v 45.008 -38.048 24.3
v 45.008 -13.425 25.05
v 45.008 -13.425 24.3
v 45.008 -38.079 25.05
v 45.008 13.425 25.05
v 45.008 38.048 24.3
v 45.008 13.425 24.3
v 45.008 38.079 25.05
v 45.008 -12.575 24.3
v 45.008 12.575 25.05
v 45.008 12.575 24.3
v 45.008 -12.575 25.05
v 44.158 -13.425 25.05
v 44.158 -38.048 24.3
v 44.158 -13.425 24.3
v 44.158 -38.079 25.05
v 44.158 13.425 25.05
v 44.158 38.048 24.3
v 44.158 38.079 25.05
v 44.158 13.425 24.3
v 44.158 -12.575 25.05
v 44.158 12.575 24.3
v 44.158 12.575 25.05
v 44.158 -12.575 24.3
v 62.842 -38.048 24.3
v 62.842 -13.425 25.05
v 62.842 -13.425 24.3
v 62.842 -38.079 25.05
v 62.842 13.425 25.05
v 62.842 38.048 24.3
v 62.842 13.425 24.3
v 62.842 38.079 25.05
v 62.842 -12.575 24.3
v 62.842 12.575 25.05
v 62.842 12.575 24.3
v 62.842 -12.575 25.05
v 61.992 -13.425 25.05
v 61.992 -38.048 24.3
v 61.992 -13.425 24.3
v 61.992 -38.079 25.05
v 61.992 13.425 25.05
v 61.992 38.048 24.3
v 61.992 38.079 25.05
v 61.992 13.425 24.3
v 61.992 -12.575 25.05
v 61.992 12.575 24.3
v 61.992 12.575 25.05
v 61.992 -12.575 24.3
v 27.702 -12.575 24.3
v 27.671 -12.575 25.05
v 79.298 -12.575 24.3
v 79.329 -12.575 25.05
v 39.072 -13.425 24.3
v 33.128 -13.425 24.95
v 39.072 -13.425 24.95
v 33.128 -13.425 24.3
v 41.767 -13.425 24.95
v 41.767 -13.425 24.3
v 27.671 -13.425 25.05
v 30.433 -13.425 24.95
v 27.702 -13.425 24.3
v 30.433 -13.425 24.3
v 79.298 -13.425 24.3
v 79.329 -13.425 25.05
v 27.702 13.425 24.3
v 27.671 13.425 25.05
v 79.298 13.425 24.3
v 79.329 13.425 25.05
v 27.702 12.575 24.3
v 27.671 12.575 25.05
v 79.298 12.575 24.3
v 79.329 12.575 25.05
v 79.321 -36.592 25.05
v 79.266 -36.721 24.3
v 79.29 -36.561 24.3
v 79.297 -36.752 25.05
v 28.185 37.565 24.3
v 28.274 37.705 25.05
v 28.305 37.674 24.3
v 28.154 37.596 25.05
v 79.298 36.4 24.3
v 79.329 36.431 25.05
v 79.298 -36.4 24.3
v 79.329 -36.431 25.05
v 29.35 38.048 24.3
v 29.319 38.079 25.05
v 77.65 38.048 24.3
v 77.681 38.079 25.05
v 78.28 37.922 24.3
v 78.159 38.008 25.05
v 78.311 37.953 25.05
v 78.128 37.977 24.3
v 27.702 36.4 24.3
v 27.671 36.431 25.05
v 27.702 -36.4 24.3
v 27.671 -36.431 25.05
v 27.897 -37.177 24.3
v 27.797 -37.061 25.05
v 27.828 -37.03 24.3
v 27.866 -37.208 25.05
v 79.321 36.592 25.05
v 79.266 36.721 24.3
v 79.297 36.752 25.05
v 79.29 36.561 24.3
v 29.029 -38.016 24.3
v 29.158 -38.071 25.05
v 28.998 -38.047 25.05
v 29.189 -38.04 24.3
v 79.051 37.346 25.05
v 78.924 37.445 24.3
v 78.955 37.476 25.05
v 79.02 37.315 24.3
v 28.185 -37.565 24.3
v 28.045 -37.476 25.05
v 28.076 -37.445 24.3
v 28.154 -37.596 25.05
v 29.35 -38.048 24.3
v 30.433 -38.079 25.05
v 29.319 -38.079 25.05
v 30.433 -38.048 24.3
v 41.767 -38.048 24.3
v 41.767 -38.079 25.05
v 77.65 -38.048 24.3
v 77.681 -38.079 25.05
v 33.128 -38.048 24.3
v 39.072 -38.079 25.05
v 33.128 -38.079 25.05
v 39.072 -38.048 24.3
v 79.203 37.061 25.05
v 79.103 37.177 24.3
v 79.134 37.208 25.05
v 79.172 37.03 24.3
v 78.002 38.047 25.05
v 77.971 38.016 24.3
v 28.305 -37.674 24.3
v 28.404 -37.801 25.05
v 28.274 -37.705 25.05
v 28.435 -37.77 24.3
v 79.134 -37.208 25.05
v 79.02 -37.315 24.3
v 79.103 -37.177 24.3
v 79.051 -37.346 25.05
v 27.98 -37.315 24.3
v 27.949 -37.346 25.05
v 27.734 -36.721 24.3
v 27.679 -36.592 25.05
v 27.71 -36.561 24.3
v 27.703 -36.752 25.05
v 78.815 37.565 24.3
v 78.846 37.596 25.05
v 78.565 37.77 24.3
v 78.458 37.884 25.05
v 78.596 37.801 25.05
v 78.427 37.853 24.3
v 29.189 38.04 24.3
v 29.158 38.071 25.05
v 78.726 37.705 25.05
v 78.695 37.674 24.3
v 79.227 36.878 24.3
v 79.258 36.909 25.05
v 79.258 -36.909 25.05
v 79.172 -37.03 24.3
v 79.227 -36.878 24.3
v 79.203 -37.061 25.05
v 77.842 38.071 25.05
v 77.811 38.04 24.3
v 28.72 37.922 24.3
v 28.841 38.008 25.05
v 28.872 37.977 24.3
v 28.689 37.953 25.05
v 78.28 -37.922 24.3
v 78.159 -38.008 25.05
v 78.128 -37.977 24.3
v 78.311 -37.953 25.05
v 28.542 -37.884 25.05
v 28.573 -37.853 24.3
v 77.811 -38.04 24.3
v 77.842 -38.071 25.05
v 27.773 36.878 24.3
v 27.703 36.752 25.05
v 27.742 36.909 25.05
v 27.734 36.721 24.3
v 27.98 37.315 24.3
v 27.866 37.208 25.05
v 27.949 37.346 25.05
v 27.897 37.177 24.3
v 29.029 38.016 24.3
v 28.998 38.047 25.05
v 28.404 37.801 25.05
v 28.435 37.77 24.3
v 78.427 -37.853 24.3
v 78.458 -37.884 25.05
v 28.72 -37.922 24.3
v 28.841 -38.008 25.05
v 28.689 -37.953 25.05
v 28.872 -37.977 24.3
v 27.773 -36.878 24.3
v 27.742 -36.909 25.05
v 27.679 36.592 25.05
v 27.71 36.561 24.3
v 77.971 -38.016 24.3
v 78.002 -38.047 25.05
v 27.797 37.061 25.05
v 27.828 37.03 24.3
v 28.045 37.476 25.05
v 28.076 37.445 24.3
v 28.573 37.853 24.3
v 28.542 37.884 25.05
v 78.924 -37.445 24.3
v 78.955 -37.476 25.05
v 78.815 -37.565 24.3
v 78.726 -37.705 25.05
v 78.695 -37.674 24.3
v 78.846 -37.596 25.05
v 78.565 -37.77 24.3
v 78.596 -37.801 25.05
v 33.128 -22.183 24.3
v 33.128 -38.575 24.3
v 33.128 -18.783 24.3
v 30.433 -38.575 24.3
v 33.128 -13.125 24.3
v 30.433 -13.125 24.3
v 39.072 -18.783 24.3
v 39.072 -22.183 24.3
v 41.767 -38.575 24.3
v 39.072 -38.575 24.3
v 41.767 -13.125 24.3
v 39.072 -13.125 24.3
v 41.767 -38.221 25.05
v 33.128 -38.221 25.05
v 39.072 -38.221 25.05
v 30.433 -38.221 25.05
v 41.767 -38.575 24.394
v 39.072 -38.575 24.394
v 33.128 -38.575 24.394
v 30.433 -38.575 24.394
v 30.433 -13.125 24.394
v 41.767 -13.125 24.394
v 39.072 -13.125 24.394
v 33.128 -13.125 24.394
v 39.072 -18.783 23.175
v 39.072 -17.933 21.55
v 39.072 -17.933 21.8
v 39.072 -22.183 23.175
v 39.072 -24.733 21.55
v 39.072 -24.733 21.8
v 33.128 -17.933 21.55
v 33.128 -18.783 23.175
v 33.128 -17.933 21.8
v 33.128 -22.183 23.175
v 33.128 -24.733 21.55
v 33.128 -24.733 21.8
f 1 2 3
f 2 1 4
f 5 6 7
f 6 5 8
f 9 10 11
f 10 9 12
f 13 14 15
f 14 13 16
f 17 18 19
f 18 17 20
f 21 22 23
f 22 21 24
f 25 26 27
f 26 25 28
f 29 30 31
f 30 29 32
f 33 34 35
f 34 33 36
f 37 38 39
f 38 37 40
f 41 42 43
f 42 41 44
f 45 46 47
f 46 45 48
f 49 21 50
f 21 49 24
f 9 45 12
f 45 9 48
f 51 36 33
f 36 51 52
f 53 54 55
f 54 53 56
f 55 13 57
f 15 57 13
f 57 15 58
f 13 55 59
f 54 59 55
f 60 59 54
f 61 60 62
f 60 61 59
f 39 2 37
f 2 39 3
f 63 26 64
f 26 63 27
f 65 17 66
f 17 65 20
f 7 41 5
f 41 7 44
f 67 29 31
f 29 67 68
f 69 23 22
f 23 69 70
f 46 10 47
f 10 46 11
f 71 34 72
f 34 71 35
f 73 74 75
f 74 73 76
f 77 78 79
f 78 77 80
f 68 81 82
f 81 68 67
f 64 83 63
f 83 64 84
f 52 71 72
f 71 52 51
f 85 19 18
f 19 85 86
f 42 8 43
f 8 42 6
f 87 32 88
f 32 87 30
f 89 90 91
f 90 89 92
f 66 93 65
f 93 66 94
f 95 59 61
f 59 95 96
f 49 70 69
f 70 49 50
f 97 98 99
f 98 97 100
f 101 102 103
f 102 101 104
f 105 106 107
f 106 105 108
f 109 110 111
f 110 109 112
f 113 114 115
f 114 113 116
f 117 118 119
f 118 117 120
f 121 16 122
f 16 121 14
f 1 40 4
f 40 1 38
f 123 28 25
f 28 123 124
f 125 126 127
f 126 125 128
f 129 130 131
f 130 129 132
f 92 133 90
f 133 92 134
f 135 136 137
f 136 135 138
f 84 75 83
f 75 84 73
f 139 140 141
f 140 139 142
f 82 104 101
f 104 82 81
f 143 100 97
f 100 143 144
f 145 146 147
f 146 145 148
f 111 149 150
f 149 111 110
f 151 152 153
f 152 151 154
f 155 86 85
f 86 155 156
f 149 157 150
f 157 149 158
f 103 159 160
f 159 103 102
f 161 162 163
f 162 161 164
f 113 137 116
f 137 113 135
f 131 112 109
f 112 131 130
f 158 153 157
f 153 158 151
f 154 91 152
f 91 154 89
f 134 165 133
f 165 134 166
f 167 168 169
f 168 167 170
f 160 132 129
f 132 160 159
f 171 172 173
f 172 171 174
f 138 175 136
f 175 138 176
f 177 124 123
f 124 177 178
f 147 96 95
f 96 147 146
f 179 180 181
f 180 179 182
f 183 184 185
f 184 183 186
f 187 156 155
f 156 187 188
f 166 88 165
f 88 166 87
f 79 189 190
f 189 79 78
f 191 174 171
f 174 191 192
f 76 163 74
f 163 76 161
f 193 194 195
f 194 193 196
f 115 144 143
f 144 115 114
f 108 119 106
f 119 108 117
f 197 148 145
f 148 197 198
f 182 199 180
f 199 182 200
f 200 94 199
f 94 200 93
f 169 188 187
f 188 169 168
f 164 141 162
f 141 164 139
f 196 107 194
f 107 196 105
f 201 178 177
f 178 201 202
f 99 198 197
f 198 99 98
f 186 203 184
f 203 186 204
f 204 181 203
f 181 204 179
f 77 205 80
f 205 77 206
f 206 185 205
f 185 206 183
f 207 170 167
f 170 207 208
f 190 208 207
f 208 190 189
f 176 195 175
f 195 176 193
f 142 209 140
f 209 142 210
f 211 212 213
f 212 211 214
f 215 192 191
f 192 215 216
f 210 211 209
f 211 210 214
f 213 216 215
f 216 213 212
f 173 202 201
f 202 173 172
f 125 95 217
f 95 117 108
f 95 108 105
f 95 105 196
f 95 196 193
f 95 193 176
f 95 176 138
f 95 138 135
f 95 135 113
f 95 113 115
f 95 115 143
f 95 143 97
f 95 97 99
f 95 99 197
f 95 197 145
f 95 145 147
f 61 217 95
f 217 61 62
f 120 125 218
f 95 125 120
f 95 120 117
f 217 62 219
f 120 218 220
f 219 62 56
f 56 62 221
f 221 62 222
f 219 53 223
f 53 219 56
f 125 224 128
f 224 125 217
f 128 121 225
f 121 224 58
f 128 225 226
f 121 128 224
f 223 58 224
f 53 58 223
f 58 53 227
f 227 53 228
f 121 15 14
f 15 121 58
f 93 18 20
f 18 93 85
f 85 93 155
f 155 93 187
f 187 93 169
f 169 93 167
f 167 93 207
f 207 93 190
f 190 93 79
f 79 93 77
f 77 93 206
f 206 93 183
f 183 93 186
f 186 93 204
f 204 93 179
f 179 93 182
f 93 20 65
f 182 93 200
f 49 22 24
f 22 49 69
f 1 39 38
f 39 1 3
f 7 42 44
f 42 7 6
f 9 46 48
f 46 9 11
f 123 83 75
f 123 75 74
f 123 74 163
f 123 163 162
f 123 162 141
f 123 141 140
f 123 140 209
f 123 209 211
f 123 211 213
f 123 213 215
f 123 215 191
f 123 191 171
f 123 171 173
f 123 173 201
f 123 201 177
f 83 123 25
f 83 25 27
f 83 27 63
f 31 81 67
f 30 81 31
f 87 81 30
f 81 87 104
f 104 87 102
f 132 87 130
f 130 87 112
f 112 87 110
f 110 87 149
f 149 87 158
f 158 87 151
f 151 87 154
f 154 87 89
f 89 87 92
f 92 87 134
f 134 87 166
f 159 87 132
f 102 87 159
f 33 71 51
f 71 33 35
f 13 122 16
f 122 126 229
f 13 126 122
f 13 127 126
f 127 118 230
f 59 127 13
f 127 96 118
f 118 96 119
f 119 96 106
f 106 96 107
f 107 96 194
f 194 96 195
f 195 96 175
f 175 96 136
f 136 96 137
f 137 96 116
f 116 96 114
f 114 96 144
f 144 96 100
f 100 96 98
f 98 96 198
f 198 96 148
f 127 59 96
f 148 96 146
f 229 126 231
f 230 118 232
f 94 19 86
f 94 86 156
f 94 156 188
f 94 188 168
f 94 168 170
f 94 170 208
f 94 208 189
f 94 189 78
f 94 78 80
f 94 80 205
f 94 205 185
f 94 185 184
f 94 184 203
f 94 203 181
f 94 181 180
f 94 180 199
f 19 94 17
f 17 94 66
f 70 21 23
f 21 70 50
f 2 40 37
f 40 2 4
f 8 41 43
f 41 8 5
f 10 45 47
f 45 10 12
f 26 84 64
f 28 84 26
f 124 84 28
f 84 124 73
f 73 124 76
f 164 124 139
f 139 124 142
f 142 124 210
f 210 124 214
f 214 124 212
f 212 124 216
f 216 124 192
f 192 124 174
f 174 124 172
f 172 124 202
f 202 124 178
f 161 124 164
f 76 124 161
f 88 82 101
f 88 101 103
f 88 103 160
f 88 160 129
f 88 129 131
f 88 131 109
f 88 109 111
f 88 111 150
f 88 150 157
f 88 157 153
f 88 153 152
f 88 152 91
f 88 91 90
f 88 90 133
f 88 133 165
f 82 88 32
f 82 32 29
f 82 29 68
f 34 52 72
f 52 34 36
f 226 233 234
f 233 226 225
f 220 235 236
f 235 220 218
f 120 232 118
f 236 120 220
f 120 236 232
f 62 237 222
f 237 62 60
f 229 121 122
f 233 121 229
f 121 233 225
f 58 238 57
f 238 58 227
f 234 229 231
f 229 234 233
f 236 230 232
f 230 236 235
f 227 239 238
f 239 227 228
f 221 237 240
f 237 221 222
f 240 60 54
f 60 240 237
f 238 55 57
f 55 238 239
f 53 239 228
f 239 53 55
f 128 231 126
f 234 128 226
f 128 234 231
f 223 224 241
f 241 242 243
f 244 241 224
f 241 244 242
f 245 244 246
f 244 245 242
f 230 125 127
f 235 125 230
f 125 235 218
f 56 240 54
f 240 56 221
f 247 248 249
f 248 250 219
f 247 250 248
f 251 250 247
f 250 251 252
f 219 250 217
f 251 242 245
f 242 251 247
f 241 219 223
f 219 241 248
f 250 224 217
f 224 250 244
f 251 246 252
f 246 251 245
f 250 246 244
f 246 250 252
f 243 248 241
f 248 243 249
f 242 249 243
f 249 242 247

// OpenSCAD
/**
 * Harbor Freight Small Parts Storage Tray Bins
 * 
 * Insipired by: 
 *     https://www.thingiverse.com/thing:569241
 *     https://www.thingiverse.com/thing:671740
 * 
 * You can use this as a box generator. Woohoo. Fun.
 * 
 * I'm including many STLs for boxes I've generated and use.
 * But of course you can use this to generate custom boxes, too. Without having to learn a CAD tool. :-)
 * 
 * I've made the module take a couple of parameters.
 *    wall_thickness - let's you control the wall thickness, so you can optimize STLs for your printer nozzle and layer height.
 *    subdivisions = [by length, by width] Lets you define a number of 'buckets' to put in each tray. A normal tray will have 1 bucket, which translates to [1, 1]. If you wanted 3 buckets along the length, and two rows of them, [3, 2] is what you want.
 *    box_size = [length , width] - Lets you define the size of the box in units it occupies in the storage system! A 'small' box is a [1, 1]. The HF kit comes with [1,1], [2, 1], and [2, 2] sizes.
*/

/** -- Basic Single "bucket" (no sub-divisions) trays -- */
 
// Your basic 'small' tray.
//hf_tray();

// A 'medium' tray
//hf_tray(box_size = [1, 2]);

// A 'large' tray
//hf_tray(box_size = [2, 2]);

// A tray size you can't even get at HF.
//hf_tray(box_size = [3, 3]);

/** -- Subdivisions! -- */

// A 'small' tray with sub-divisions (3 along the length, 2 along the width).
//hf_tray(subdivisions = [3, 2]);

// A Medium tray with 6 slots to put things like through-hole resistor tape reels in.
//hf_tray(box_size = [2, 2], subdivisions = [6, 1]); 


/** -- Wall Thickness! -- */
/* Wall thickness can be optimized to give your slicing 
    software something really peaceful to work with. It can 
    speed up print times, improve print quality, etc.

    I've tested a few of these configurations with Slic3r using
    0.25 and 0.4 nozzles printing nylon trimmer string.
*/
     
// Printing with a 0.25 nozzle, at 0.10mm / layer, 3 perimeters.
//hf_tray(subdivisions = [1, 1], wall_thickness = 0.71);

// Printing with a 0.25 nozzle, at 0.20mm / layer, 2 perimeters.
//hf_tray(subdivisions = [2, 2], wall_thickness = 0.66);

// Printing with a 0.4 nozzle, at 0.10mm / layer, 2 perimeters.
//hf_tray(subdivisions = [2, 2], wall_thickness = .88, lip_height = 1.5);


/** -- lip_height! -- */
/* For more robust / ridgid boxes along the top edge, increase the lip height. 
    The HF trays tend to have a 0.75mm lip, a consequence of the injection 
    molding process with polypropylene. I found that using the thin walls above
    things were a bit too flimsey at the top edge for my liking, and a slightly taller
    lip worked well to stiffen up the nylon.
*/

//hf_tray(box_size = [2, 2],
//            subdivisions = [6, 1],
//            wall_thickness = 0.88,
//            lip_height = 1.5);
         
/** -- Stacking Fractional height units!!! -- */
/* To really make the most of the storage space, set a box_size with a fractional 'z' height,
    make sure you make the lower boxes is_top = false
*/

// A tray that's one of the lower two in a stack of 3.
//hf_tray(box_size = [2, 2, (1/2)],
//            subdivisions = [4, 2],
//            wall_thickness = 0.86,
//            lip_height = 1.5,
//            is_top = true);
            

// A tray that's the top box in a stack of 3.
//hf_tray(box_size = [2, 2, (1/3)],
//            subdivisions = [6, 1],
//            wall_thickness = 0.88,
//            lip_height = 1.5,
//            is_top = true);


/** Customizer Support **/
 
/* [Box Dimensions] */
// Number of units wide a box is.
box_width = 1;
// Number of units long a box is.
box_length = 2;

// Box Depth how tall the box is (for stacking).
box_depth = 0.5; // [1:1, 0.5:1/2, 0.33333:1/3, 0.25:1/4, 0.75:3/4, 0.66666:2/3]

// Is the box the top box in the stack?
top_of_stack = 1; // [1:Yes, 0:No]
lid = 0; // [1:Yes, 0:No]

// How many subdivisions along the width of the box.
subdivisions_wide = 3;
// How many subdivisions along the length of the box.
subdivisions_long = 3;


/* [Bin Geometry] */
// Height of the lip around the top
lip = .5;
// Corner Radius
corner_radius = 2.5;
// Taper ration of the bin.
taper = 0.9;
// Height of the bin.
box_height = 47.5; // [47.5, 46.15]

/* [Lids] */
lids = 1; // [1:Yes, 0:No]

/* [Foot Geometry] */
// Separate the feet from the box? (for easier printing)
separate_feet = 1; // [1:Yes, 0:No]
// Slop to use when creating the joinery hole for the foot.
// 0.2 works well when using a 0.4mm nozzle.
foot_joinery_slop = 0.2;
// height of the foot, in mm.
foot_height = 3.85; // [3.85, 1.75]
// Taper height. Foot will taper from the bottom to this height, at which point it will be 'full size'.
foot_taper_height = 2.00;
// Taper the foot to the bottom by this many mm. Makes it easier to nest.
foot_taper = 0.5;


/* [Print Tweaks] */
// Specify this based on your print settings.
wall_thickness = 0.85;
bottom_thickness = 0.75;

// The height of the wider reinforcing lip at the top of the box.
lip_height = 1.5;

/* [Hidden] */
$fn = 64;



hf_tray(box_size = [box_width, box_length, box_depth],
            subdivisions = [subdivisions_wide, subdivisions_long],
            wall_thickness = wall_thickness,
            lip_height = lip_height,
            is_top = (top_of_stack == 1));

module hf_tray(box_size = [1, 1], subdivisions = [1, 1], wall_thickness = 0.8, lip_height = 0.75, is_top = true) {
    // Size of a 'small' unit in the storage system.
    unit_length = 54.5 * box_size[0];
    unit_width = 39.5 * box_size[1] ;
    unit_height = ((box_height - bottom_thickness) * (len(box_size) < 3 ? 1 : box_size[2])) +
                         (len(box_size) < 3 || box_size[2] == 1 ? 0 : box_size[2] * (corner_radius + wall_thickness));

    x_div = subdivisions[0];
    y_div = subdivisions[1];

    // Do a bunch of boundary calculations up-front, so we don't have to keep doing math all over the place.

    // Top lip x and y
    top_lip_length = unit_length - (corner_radius * 2);
    top_lip_width = unit_width - (corner_radius * 2);

    // Top x and y
    top_length = top_lip_length - (lip * 2);
    top_width = top_lip_width - (lip * 2);

    top_inside_length = top_length - (wall_thickness * 2);
    top_inside_width = top_width - (wall_thickness * 2);
    
    // Lid
    lid_length = top_lip_length / y_div - (wall_thickness * y_div);
    lid_width = top_lip_width / x_div - (wall_thickness * x_div);

    // Bottom x and y
    bottom_length = top_length - (taper * 2);
    bottom_width = top_width - (taper * 2);

    bottom_inside_length = bottom_length - (wall_thickness * 2);
    bottom_inside_width = bottom_width - (wall_thickness * 2);
    
    // Flip it right-side up.
    translate([0, 0, unit_height + foot_height]) rotate([180, 0, 0]) {
    difference() {
        // Union everything.
        union() {
            // Subtract the 'inside' void'
            difference() {
                // Main shell.
                union () {
                    // top lip.
                    minkowski() {
                        translate([-top_lip_length / 2, -top_lip_width / 2, 0]) cube([top_lip_length, top_lip_width, lip_height / 2]);
                        union() {
                            cylinder(r = corner_radius, h = lip_height / 2);
                            translate([0, 0, lip_height / 2]) 
                            cylinder(r1 = corner_radius, 
                                                r2 = corner_radius - wall_thickness / 2, h = lip_height / 2);
                        }
                    }

                    // Taperd Body
                    minkowski() {
                        // Hull the top and bottom for a proper taper.
                        hull() {
                            // top 
                            translate([-top_length / 2, -top_width / 2, lip_height]) cube([top_length, top_width, 1]);
                            // bottom
                            translate([-bottom_length / 2, -bottom_width / 2, unit_height - corner_radius - 1]) cube([bottom_length, bottom_width, 1]);
                        }
                        // Minkowski a sphere around it.
                        scale([1, 1, (separate_feet ? 1.75 : 1)])
                            sphere( r = corner_radius);
                    }
                }
                
                // Cut the bottom of the body flush.
                // (removes minkowski round-over at the 'top' of the bin)
                translate([-unit_length / 2, -unit_width / 2, -corner_radius * 2]) 
                    cube([unit_length, unit_width, corner_radius * 2]);
                // (removes minkowski rount-over at the 'bottom' of the bin)
                translate([-unit_length / 2, -unit_width / 2, unit_height]) 
                    cube([unit_length, unit_width, corner_radius * 2]);
                
                // Produce a 'positive' to remove from the main cavity. Think of it like a press die.
                inside_positive(top_length, top_width, bottom_length, bottom_width, 
                                unit_height, corner_radius, bottom_thickness, wall_thickness, x_div, y_div, is_top,
                                top_inside_length, top_inside_width);
            }

            // Add the feet.
            foot(bottom_length = bottom_length, bottom_width = bottom_width, unit_height = unit_height, corner_radius = corner_radius, foot_height = foot_height);
            mirror([1, 0, 0]) foot(bottom_length = bottom_length, bottom_width = bottom_width, unit_height = unit_height, corner_radius = corner_radius, foot_height = foot_height);
            mirror([0, 1, 0]) foot(bottom_length = bottom_length, bottom_width = bottom_width, unit_height = unit_height, corner_radius = corner_radius, foot_height = foot_height);
            rotate([0, 0, 180]) foot(bottom_length = bottom_length, bottom_width = bottom_width, unit_height = unit_height, corner_radius = corner_radius, foot_height = foot_height);
        }
        
        
        // If we're doing detached feet, add the holes for feet.
        if (separate_feet == 1) {
                foot_holes(bottom_length = bottom_length, bottom_width = bottom_width, unit_height = unit_height, corner_radius = corner_radius, foot_height = foot_height);
                mirror([1, 0, 0]) foot_holes(bottom_length = bottom_length, bottom_width = bottom_width, unit_height = unit_height, corner_radius = corner_radius, foot_height = foot_height);
                mirror([0, 1, 0]) foot_holes(bottom_length = bottom_length, bottom_width = bottom_width, unit_height = unit_height, corner_radius = corner_radius, foot_height = foot_height);
                rotate([0, 0, 180]) foot_holes(bottom_length = bottom_length, bottom_width = bottom_width, unit_height = unit_height, corner_radius = corner_radius, foot_height = foot_height);
        }
        
        // Make the cut to receive lids.
        lids(top_length, top_width, bottom_length, bottom_width, unit_height, corner_radius, bottom_thickness, 
             wall_thickness, x_div, y_div, is_top, top_inside_length, top_inside_width, top_of_stack, 1);
    }
    
    
    // Position the lids for printing
!    translate([top_length + corner_radius * 2, 0, unit_height + 3.5 - bottom_thickness]) mirror([0, 0, 1])
    lids(top_length, top_width, bottom_length, bottom_width, unit_height, corner_radius, bottom_thickness, 
         wall_thickness, x_div, y_div, is_top, top_inside_length, top_inside_width, top_of_stack, 0);
}}


module lids(top_length, top_width, bottom_length, bottom_width, unit_height, corner_radius, bottom_thickness, wall_thickness, x_div, y_div, is_top, top_inside_length, top_inside_width, top_of_stack, lid_positive) {
    if (top_of_stack == 1 && lids == 1) {
        // Intersect the lid top geometry with the positive die.
        intersection() {
            // Move to just below the relief for the top box lid location
            translate([0, 0, 3.5 - bottom_thickness / 2]) {
                cube([top_length + 2 * corner_radius, top_width + 2 * corner_radius, bottom_thickness], center = true);
            }
            
            inside_positive(top_length, top_width, bottom_length, bottom_width, 
                            unit_height, corner_radius, bottom_thickness, wall_thickness, x_div, y_div, is_top,
                            top_inside_length, top_inside_width, relief_cuts = 0);
        }
        // Add the friction tabs to hold the lids in place
        translate([0, 0, 3.5 - bottom_thickness]) {
            x = (top_length + corner_radius) / x_div;
            y = (top_width + corner_radius)/ y_div;
            
            if (x_div > 1 && y_div > 1) {
                for ( ytab = [0 : y_div - 1] ) {
                    for ( xtab = [0 : x_div - 1] ) {
                        xtab = 0;
                        ytab = 0;
                        translate([-top_inside_length / 2 - corner_radius, -top_inside_width / 2 - corner_radius, 0])
                        translate([x / 2, y / 2, 0])
                        translate([xtab * (x + wall_thickness / 2), ytab * (y + wall_thickness / 2), 0])
                        {
                            difference() {
                                translate([0, -wall_thickness / y_div, bottom_thickness / 16]) {
                                    hull() {
                                    // Make the tab.
#                                    cube([x * (2/3),
                                          y - wall_thickness / 2,
                                          bottom_thickness / 8], center = true);
                                    translate([0, 0, bottom_thickness - (bottom_thickness / 8)])
                                    cube([x * (2/3),
                                          y + wall_thickness / 3,
                                          bottom_thickness / 8], center = true);
                                    }
                                }
                                translate([0, 0, bottom_thickness / 2]) {
                                    cube([((top_length + (2 * corner_radius)) / x_div) * (1/3), 
                                           ((top_width + (2 * corner_radius)) / y_div) - (wall_thickness * .5) + 2,
                                           bottom_thickness + 1], center = true);
                                }
                            }
                        
                            // Add the 'handle' to extract the lids.
                            if (lid_positive == 0) {
                                translate([0, (top_inside_width / y_div) / 2 - wall_thickness * 8, 3.5 / 2]) {
                                    cube([((top_length + (2 * corner_radius)) / x_div) * (1/3), wall_thickness * 4, 3.5], center = true);
                                   hull() {
                                        translate([0, 0, 3.5 / 2 - 1.5])
                                            cube([((top_length + (2 * corner_radius)) / x_div) * (1/3), wall_thickness * 4, 0.25],
                                                 center = true);
                                        translate([0, -wall_thickness, 3.5 / 2 - 0.25 / 2])
                                            cube([((top_length + (2 * corner_radius)) / x_div) * (1/3), wall_thickness * 8, 0.25],
                                                 center = true);
                                    }
                                }
                            }
                        }
                    }
                }
            }
        }
    }    
}    
    

// Produce a 'positive' to remove from the main cavity. Think of it like a press die.
module inside_positive(top_length, top_width, bottom_length, bottom_width, unit_height, corner_radius, bottom_thickness, wall_thickness, x_div, y_div, is_top, top_inside_length, top_inside_width, relief_cuts = 1) {
    difference() {
        // Tapered body main cavity.
        minkowski() {
            // Hull the top and bottom for a proper taper.
            hull() {
                // top 
                translate([-top_length / 2, -top_width / 2, 0]) cube([top_length, top_width, 1]);
                // bottom
                translate([-bottom_length / 2, -bottom_width / 2, unit_height - corner_radius - bottom_thickness]) cube([bottom_length, bottom_width, 1]);
            }
            
            // Minkowski a sphere around it.
            scale([corner_radius - wall_thickness, corner_radius - wall_thickness, bottom_thickness * 2])
                sphere(r = 1);
        }
        
        
        // Now that there's a positive shape for being pushed into the tray to form the inside,
        // remove any divider walls from the positive.
        if (x_div > 1 || y_div > 1) {
            difference() {
                union() {
                    if (x_div > 1) {
                        for ( xwall = [1 : x_div - 1] ) {
                            translate([-top_length / 2 - corner_radius + (xwall * ((top_length + 2 * corner_radius) / x_div)),
                                       0,
                                       unit_height / 2])
                            if (is_top) {
                                cube([wall_thickness, top_width + (2 * corner_radius), unit_height], center = true);
                            } else {
                                translate([0, 0, foot_height + wall_thickness])
                                cube([wall_thickness, top_width + (2 * corner_radius), unit_height], center = true);
                            }
                        }
                    }
                    
                    if (y_div > 1) {
                        for (ywall = [1 : y_div - 1]) {
                            translate([0,
                                       -top_width / 2 - corner_radius + (ywall * ((top_width + 2 * corner_radius) / y_div)),
                                            unit_height / 2])
                            if (is_top) {
                                cube([top_length + (2 * corner_radius), wall_thickness, unit_height], center = true);
                            } else {
                                translate([0, 0, foot_height + wall_thickness])
                                cube([top_length + (2 * corner_radius), wall_thickness, unit_height], center = true);
                            }
                        }
                    }
                }
                
                if (relief_cuts == 1) {
                    // Cut reliefs around the outside edge of the divider walls for the container lid to hold the boxes in place.
                    translate([-top_inside_length / 2 - corner_radius, -top_inside_width / 2 - corner_radius, 0])
                        rotate([-90, 0, 0]) 
                            cylinder(r = 3.5, h = top_inside_width + 2 * corner_radius);
                    
                    translate([top_inside_length / 2 + corner_radius, -top_inside_width / 2 - corner_radius, 0]) 
                        rotate([-90, 0, 0]) 
                            cylinder(r = 3.5, h = top_inside_width + 2 * corner_radius);
                    
                    translate([-top_inside_length / 2 - corner_radius, -top_inside_width / 2 - corner_radius, 0]) 
                        rotate([0, 90, 0]) 
                            cylinder(r = 3.5, h = top_inside_length + 2 * corner_radius);
                    
                    translate([-top_inside_length / 2 - corner_radius, top_inside_width / 2 + corner_radius, 0]) 
                        rotate([0, 90, 0]) 
                            cylinder(r = 3.5, h = top_inside_length + 2 * corner_radius);
                }
            }
        }
        
        // Then we need to remove the corners to block for stacking.
        // Set the threshold to 2, so that the upper stack doesn't "rock" back and forth.
        if (is_top != true && x_div <= 2 && y_div <= 2) {
            for (mx = [0, 1]) {
                mirror([mx, 0, 0]) {
                    for (my = [0, 1]) {
                        mirror([0, my, 0]) {
                            translate([-top_length / 2 - (wall_thickness / 2) - corner_radius,
                                       -top_width / 2 - corner_radius, 0])
                                translate([wall_thickness, wall_thickness, foot_height + wall_thickness])
                                    cylinder(d = wall_thickness * 2 + 2 * corner_radius, h = unit_height);
                        }
                    }
                }
            }
        }
    }
}


module foot_holes(bottom_length = 0, bottom_width = 0, unit_height = 0, corner_radius = 2.5, foot_height = 2.5) {
    // Box section to receive the foot
    translate([-bottom_length / 2, -bottom_width / 2, unit_height - corner_radius]) {
        rotate([0, 0, 45])
            translate([0, 0, 0])
                scale([1, 1.25, 1])
                    cylinder(d = 2 + foot_joinery_slop, h = foot_height + corner_radius);
    }
}

module foot(bottom_length = 0, bottom_width = 0, unit_height = 0, corner_radius = 2.5, foot_height = 2.5) {
    // Flat part to receive the foot.
    translate([-bottom_length / 2, -bottom_width / 2, unit_height - corner_radius]) {
        rotate([0, 0, 45])
        difference() {
            cylinder(r = corner_radius, h = corner_radius);
            translate([0, -corner_radius, 0]) 
                cube([corner_radius, 2 * corner_radius, corner_radius / 2 * (separate_feet ? 1.75 : 1)]);
            sphere(r = corner_radius);
        }
    }
    
    if (separate_feet) {
        // Create the protrusion to fit the joinery hole.
        translate([-bottom_length / 2 - (separate_feet ? 10 : 0), -bottom_width / 2 - (separate_feet ? 10 : 0), unit_height - (separate_feet ? foot_height : 0)]) 
            rotate([0, 0, 45])
                translate([0, 0, -corner_radius / 2])
                    scale([1, 1.25, 1])
                        cylinder(d = 2, h = foot_height);
    }
    
    // Actual part of the foot.
    translate([-bottom_length / 2 - (separate_feet ? 10 : 0), -bottom_width / 2 - (separate_feet ? 10 : 0), unit_height - (separate_feet ? foot_height : 0)]) {
        rotate([0, 0, 45]) {
            difference() {
                union() {
                    cylinder(r = corner_radius, h = foot_height - foot_taper_height);
                    translate([0, 0, foot_height - foot_taper_height]) cylinder(r1 = corner_radius, r2 = corner_radius - foot_taper, h = foot_taper_height);
                    
                }
                translate([corner_radius / 2, -corner_radius, 0]) 
                    cube([corner_radius, 2 * corner_radius, foot_height]);
            }
        }
    }
}
